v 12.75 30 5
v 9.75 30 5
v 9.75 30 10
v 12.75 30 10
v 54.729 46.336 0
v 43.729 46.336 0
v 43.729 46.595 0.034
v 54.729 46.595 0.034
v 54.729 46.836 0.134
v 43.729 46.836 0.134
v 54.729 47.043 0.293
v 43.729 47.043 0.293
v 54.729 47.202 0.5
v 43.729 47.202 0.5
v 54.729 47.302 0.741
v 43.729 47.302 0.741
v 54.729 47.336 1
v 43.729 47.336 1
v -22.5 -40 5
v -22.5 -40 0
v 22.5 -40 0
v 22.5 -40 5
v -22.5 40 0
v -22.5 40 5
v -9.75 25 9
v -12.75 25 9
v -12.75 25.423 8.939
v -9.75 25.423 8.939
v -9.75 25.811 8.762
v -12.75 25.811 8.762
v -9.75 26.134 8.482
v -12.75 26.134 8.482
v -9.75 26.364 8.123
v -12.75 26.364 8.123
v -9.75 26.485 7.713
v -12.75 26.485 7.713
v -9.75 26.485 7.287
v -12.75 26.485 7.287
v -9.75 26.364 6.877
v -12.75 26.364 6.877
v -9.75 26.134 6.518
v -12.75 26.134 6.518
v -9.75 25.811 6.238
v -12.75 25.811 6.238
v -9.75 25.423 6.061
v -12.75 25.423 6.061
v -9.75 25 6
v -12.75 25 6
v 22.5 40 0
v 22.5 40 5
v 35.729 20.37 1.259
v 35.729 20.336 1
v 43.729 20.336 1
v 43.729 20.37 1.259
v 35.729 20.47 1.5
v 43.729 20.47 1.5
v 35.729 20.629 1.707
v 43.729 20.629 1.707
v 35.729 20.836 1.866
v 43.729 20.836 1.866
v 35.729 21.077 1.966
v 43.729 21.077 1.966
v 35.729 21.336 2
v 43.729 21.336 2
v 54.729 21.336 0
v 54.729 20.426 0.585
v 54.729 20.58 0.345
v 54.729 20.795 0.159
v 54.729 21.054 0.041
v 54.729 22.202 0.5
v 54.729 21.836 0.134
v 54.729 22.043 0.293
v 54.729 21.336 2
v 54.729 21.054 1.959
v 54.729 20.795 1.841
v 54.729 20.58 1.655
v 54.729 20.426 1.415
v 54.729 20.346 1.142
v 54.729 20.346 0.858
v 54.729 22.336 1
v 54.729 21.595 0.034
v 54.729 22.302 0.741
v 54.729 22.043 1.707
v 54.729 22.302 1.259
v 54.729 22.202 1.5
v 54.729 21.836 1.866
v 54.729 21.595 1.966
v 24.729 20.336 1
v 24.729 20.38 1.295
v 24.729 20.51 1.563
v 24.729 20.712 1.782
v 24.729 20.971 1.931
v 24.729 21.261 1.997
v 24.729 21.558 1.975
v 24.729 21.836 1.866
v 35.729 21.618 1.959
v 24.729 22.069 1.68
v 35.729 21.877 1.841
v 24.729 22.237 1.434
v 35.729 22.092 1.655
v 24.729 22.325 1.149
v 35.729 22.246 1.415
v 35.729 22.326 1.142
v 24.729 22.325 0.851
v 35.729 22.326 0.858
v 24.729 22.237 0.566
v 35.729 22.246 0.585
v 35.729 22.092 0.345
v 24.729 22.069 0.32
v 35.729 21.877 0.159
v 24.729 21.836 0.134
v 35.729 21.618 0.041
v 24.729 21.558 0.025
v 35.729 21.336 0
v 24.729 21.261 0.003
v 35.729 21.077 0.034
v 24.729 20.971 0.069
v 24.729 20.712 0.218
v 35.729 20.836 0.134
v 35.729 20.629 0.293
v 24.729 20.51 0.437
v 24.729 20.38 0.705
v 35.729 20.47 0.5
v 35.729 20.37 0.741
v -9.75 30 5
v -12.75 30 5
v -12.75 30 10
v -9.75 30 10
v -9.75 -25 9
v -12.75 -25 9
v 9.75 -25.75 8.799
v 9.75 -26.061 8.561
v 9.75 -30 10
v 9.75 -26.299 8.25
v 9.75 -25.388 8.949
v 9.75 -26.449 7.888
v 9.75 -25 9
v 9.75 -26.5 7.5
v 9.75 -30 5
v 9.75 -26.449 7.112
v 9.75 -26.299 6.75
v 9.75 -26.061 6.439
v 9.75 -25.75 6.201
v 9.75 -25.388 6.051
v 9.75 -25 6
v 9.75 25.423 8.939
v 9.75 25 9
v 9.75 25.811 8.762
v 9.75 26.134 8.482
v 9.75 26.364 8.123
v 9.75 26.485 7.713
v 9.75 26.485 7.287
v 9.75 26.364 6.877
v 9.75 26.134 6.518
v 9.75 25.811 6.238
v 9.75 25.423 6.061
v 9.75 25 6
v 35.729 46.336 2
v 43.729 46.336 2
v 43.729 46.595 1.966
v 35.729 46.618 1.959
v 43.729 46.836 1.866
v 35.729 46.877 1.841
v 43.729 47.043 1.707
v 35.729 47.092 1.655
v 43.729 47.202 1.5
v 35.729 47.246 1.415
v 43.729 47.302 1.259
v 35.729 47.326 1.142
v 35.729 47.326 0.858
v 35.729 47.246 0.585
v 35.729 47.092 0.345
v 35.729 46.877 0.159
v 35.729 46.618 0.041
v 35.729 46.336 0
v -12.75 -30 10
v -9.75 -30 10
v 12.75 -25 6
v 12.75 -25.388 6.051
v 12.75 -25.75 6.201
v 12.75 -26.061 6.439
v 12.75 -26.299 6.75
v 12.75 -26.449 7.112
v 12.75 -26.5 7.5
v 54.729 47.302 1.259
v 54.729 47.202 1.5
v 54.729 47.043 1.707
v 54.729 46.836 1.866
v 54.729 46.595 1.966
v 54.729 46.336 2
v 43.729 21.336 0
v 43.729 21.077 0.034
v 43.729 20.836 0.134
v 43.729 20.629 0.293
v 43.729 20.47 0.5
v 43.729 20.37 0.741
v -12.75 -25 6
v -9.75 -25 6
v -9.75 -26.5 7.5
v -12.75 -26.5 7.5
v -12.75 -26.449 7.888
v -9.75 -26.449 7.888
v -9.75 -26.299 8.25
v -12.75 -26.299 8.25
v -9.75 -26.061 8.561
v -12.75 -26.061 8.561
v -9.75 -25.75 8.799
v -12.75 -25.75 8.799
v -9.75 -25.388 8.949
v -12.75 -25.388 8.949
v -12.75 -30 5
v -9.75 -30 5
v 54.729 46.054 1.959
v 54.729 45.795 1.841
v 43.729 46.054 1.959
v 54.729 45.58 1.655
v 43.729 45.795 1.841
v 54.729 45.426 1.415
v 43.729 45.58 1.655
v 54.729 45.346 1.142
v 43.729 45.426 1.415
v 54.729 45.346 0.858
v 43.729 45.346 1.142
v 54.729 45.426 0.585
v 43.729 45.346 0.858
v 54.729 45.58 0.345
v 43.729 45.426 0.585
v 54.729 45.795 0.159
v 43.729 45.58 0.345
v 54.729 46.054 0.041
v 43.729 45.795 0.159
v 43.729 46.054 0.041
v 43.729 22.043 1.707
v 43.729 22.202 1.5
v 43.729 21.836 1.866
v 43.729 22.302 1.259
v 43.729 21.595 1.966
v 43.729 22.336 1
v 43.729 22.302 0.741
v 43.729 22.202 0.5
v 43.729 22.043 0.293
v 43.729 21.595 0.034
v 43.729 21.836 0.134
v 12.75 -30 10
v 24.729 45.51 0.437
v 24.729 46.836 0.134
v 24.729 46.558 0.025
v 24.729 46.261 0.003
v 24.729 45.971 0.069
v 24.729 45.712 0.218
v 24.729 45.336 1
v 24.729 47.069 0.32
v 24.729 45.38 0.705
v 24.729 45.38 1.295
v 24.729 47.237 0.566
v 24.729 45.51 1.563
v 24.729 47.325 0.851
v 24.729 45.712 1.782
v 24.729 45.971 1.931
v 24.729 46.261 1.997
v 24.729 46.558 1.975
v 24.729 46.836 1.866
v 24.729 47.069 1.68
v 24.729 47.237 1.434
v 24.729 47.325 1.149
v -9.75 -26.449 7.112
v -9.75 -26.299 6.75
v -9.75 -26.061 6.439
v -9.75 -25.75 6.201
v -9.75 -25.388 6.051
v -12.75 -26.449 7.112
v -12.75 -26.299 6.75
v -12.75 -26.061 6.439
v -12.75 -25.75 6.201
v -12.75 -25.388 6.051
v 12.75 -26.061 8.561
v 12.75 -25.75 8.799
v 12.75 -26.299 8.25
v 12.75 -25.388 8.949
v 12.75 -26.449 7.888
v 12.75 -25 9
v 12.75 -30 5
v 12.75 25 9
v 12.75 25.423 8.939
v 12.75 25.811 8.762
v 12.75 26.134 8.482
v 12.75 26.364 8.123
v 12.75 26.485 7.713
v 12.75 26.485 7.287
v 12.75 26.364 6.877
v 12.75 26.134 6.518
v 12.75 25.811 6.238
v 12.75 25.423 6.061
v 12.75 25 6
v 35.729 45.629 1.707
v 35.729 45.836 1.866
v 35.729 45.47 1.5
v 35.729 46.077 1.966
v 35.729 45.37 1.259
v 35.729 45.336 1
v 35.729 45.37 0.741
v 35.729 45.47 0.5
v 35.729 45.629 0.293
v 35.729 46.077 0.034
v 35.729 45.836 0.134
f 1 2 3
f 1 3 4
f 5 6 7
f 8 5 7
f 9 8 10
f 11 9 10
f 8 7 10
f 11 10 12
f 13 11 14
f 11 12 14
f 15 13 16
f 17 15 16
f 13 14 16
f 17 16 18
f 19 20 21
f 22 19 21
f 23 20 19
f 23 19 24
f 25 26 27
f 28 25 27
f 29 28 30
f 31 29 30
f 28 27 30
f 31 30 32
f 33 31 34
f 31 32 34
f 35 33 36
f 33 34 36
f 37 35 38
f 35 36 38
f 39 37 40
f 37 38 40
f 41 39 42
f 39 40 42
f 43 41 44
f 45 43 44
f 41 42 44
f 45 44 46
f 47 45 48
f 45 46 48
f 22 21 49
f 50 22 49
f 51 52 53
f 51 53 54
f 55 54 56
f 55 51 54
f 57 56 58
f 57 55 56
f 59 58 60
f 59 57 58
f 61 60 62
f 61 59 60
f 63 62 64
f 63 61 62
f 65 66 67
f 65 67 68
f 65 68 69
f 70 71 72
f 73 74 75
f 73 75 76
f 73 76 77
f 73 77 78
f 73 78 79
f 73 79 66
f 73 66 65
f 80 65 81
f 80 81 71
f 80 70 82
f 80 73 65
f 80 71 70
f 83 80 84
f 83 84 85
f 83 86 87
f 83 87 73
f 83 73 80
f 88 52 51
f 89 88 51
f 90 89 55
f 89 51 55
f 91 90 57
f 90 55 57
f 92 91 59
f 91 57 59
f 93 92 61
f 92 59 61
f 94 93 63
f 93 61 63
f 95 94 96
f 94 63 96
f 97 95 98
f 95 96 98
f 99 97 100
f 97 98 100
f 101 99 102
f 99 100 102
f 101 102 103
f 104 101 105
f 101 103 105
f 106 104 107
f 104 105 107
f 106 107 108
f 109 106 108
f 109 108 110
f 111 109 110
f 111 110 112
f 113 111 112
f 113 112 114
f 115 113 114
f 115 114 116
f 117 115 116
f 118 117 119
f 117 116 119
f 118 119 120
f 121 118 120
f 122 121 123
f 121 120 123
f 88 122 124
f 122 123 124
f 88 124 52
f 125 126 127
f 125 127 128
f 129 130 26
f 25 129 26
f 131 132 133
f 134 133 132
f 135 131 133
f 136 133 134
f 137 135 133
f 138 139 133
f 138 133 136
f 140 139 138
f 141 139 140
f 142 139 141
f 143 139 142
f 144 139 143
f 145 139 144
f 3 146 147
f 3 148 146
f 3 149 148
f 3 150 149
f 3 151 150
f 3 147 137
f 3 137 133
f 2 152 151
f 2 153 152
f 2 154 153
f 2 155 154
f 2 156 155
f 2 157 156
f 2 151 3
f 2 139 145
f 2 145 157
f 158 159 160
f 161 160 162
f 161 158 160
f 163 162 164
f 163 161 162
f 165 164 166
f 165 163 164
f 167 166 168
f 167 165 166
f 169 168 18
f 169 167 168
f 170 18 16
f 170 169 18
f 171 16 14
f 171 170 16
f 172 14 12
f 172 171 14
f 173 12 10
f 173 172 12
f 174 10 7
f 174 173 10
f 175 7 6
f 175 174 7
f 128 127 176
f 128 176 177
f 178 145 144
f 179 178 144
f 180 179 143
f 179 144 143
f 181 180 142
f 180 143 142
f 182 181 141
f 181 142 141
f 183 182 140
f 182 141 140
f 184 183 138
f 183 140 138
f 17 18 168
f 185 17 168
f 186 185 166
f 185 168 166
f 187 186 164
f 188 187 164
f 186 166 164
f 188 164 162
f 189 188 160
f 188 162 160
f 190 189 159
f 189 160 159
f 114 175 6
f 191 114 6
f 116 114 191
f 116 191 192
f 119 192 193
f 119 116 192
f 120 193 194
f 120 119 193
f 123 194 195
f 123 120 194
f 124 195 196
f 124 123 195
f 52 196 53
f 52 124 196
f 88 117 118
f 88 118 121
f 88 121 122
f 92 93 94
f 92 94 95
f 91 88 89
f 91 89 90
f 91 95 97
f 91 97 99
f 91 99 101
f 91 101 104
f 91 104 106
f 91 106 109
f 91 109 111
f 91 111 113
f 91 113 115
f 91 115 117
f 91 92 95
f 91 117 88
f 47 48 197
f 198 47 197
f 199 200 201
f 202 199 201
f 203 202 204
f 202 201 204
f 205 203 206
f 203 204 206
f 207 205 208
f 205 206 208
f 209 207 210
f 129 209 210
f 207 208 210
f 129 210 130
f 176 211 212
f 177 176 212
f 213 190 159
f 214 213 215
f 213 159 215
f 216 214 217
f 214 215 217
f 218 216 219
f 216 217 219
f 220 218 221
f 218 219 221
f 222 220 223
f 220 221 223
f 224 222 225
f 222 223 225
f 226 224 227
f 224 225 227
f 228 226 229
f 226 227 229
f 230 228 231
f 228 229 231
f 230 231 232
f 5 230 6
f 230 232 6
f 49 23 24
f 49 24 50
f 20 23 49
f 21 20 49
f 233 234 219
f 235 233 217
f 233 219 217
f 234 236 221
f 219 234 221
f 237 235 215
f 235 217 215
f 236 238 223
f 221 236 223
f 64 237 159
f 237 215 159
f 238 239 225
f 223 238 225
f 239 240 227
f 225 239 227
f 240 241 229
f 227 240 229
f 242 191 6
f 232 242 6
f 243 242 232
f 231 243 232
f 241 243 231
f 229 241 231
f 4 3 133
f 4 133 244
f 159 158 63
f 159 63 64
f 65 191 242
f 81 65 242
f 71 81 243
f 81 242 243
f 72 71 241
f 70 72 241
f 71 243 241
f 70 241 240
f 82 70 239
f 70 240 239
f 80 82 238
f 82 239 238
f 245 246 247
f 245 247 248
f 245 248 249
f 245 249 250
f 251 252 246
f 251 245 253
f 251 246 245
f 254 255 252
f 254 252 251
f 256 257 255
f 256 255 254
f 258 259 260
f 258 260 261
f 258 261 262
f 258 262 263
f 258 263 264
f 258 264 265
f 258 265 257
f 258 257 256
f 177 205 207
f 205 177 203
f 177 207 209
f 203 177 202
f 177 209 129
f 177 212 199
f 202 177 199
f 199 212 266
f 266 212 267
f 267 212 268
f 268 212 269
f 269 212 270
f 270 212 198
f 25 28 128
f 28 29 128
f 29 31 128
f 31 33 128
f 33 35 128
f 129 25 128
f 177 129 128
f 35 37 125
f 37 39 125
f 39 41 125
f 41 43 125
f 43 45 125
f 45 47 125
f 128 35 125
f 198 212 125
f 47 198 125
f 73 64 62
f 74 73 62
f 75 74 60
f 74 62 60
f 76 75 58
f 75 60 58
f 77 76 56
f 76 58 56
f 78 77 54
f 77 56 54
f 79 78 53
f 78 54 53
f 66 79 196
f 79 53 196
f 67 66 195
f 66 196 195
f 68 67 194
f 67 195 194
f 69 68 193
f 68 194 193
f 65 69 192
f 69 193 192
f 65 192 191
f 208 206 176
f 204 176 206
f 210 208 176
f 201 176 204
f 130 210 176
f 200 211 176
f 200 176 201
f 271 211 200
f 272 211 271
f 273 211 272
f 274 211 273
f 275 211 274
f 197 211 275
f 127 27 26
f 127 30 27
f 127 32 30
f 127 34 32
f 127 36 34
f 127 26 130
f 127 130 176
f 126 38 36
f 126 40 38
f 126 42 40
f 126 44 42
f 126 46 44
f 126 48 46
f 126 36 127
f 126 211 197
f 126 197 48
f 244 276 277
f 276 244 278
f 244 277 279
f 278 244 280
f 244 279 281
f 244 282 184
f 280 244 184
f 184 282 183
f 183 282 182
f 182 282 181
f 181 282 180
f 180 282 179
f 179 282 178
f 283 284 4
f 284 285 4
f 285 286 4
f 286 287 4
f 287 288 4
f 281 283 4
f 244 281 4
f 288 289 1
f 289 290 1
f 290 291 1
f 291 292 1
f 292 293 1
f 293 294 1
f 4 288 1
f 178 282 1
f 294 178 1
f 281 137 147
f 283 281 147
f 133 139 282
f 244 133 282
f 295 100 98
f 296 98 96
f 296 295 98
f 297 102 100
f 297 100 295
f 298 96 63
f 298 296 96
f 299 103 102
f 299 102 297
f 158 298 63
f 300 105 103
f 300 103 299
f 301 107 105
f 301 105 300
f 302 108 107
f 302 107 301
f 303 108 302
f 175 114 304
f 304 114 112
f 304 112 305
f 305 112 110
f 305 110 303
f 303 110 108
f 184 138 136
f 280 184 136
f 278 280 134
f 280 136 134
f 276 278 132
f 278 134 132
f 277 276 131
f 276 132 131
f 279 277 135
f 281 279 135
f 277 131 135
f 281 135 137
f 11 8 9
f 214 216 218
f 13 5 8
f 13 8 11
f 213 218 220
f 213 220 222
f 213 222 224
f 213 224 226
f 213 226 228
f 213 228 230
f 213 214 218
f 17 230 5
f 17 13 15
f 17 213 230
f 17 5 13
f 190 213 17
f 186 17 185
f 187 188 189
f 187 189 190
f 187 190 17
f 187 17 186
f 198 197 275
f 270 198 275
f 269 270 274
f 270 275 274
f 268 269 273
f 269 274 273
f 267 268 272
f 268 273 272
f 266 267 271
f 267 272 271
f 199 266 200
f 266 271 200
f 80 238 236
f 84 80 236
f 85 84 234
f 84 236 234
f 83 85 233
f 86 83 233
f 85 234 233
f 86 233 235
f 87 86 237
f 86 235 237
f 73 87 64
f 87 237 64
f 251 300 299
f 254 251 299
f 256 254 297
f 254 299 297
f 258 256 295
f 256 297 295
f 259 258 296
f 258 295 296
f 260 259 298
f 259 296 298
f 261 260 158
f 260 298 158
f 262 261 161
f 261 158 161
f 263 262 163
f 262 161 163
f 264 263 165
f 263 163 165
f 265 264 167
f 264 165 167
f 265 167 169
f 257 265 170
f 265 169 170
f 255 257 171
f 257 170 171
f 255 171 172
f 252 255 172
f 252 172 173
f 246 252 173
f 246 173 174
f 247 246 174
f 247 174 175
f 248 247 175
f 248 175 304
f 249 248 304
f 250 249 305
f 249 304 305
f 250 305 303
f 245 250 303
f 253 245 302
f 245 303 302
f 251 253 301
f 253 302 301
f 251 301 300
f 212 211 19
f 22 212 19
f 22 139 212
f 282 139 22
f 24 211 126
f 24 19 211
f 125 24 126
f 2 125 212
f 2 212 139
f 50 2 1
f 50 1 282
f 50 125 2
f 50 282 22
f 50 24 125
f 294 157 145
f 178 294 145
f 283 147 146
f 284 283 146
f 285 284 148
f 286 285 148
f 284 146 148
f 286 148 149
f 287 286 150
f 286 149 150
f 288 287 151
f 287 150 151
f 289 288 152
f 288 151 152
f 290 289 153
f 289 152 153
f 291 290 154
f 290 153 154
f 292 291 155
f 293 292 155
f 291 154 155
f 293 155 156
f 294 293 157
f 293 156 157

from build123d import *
from build123d import SkipClean  # not in build123d's __all__

# Parameters (mm, degrees)
F0_W      = 45
F0_H      = 80
F1_DEPTH  = 5
F2_W      = 3
F2_H      = 60
F3_DEPTH  = 5
F5_DEPTH  = 75.3
F6_W      = 8
F6_H      = 25
F7_DEPTH  = 2
F9_DEPTH  = 11
F11_DEPTH = 8
F10_R     = 1
F12_DEPTH = 11


with BuildPart() as f1:
    # F0 (on Top) → F1 (new body)
    with BuildSketch(Plane.XY):
        Rectangle(F0_W, F0_H)
    extrude(amount=F1_DEPTH)

    # F2 (on face) → F3 (join)
    with BuildSketch(Plane.XY.offset(5)):
        with Locations((-11.25, 0)):
            Rectangle(F2_W, F2_H)
        with Locations((11.25, 0)):
            Rectangle(F2_W, F2_H)
    extrude(amount=F3_DEPTH)

    # F4 (on face) → F5 (cut)
    with BuildSketch(Plane(origin=(-12.75, 0, 0), x_dir=(0, -1, 0), z_dir=(-1, 0, 0))):
        with BuildLine():
            ThreePointArc((-25, 6), (-23.9393398282, 6.4393398282), (-23.5, 7.5))
            ThreePointArc((-23.5, 7.5), (-23.9393398282, 8.5606601718), (-25, 9))
            ThreePointArc((-25, 9), (-26.5, 7.5), (-25, 6))
        make_face()
        with BuildLine():
            ThreePointArc((-25, 9), (-23.9393398282, 8.5606601718), (-23.5, 7.5))
            ThreePointArc((-23.5, 7.5), (-23.9393398282, 6.4393398282), (-25, 6))
            Line((-25, 6), (0, 6))
            Line((0, 6), (25, 6))
            ThreePointArc((25, 6), (23.5, 7.5), (25, 9))
            Line((25, 9), (0, 9))
            Line((0, 9), (-25, 9))
        make_face()
        with BuildLine():
            ThreePointArc((26.5, 7.5), (26.0606601718, 8.5606601718), (25, 9))
            ThreePointArc((25, 9), (23.5, 7.5), (25, 6))
            ThreePointArc((25, 6), (26.0606601718, 6.4393398282), (26.5, 7.5))
        make_face()
    extrude(amount=-F5_DEPTH, mode=Mode.SUBTRACT)


with BuildPart() as f7:
    # F6 (on Top) → F7 (new body)
    with BuildSketch(Plane.XY):
        with Locations((39.7293449342, 33.835914731)):
            Rectangle(F6_W, F6_H)
    extrude(amount=F7_DEPTH)

    # F8 (on face) → F9 (join)
    with BuildSketch(Plane.YZ.offset(43.7293449342)):
        with BuildLine():
            Line((21.335914731, 0), (21.335914731, 2))
            ThreePointArc((21.335914731, 2), (20.335914731, 1), (21.335914731, 0))
        make_face()
        with BuildLine():
            ThreePointArc((21.335914731, 0), (22.0430215122, 0.2928932188), (22.335914731, 1))
            ThreePointArc((22.335914731, 1), (22.0430215122, 1.7071067812), (21.335914731, 2))
            Line((21.335914731, 2), (21.335914731, 0))
        make_face()
        with BuildLine():
            Line((46.335914731, 0), (46.335914731, 2))
            ThreePointArc((46.335914731, 2), (45.335914731, 1), (46.335914731, 0))
        make_face()
        with BuildLine():
            ThreePointArc((47.335914731, 1), (47.0430215122, 1.7071067812), (46.335914731, 2))
            Line((46.335914731, 2), (46.335914731, 0))
            ThreePointArc((46.335914731, 0), (47.0430215122, 0.2928932188), (47.335914731, 1))
        make_face()
    extrude(amount=F9_DEPTH)

    # F10 (on face) → F11 (join, through all)
    with BuildSketch(Plane(origin=(35.7293449342, 0, 0), x_dir=(0, -1, 0), z_dir=(-1, 0, 0))):
        with BuildLine():
            ThreePointArc((-21.335914731, 0), (-20.6288079498, 0.2928932188), (-20.335914731, 1))
            ThreePointArc((-20.335914731, 1), (-20.6288079498, 1.7071067812), (-21.335914731, 2))
            Line((-21.335914731, 2), (-21.335914731, 0))
        make_face()
        with BuildLine():
            Line((-21.335914731, 0), (-21.335914731, 2))
            ThreePointArc((-21.335914731, 2), (-22.335914731, 1), (-21.335914731, 0))
        make_face()
        with BuildLine():
            Line((-46.335914731, 0), (-46.335914731, 2))
            ThreePointArc((-46.335914731, 2), (-47.335914731, 1), (-46.335914731, 0))
        make_face()
        with BuildLine():
            ThreePointArc((-45.335914731, 1), (-45.6288079498, 1.7071067812), (-46.335914731, 2))
            Line((-46.335914731, 2), (-46.335914731, 0))
            ThreePointArc((-46.335914731, 0), (-45.6288079498, 0.2928932188), (-45.335914731, 1))
        make_face()
    with SkipClean():  # cleaning this boolean's faces spoils the solid; the shape is the same uncleaned
        extrude(amount=-F11_DEPTH)

    # F10 (on face) → F12 (join)
    with BuildSketch(Plane(origin=(35.7293449342, 0, 0), x_dir=(0, -1, 0), z_dir=(-1, 0, 0))):
        with Locations((-21.335914731, 1)):
            Circle(F10_R)
        with Locations((-46.335914731, 1)):
            Circle(F10_R)
    extrude(amount=F12_DEPTH)


solid = Compound([f1.part, f7.part])
